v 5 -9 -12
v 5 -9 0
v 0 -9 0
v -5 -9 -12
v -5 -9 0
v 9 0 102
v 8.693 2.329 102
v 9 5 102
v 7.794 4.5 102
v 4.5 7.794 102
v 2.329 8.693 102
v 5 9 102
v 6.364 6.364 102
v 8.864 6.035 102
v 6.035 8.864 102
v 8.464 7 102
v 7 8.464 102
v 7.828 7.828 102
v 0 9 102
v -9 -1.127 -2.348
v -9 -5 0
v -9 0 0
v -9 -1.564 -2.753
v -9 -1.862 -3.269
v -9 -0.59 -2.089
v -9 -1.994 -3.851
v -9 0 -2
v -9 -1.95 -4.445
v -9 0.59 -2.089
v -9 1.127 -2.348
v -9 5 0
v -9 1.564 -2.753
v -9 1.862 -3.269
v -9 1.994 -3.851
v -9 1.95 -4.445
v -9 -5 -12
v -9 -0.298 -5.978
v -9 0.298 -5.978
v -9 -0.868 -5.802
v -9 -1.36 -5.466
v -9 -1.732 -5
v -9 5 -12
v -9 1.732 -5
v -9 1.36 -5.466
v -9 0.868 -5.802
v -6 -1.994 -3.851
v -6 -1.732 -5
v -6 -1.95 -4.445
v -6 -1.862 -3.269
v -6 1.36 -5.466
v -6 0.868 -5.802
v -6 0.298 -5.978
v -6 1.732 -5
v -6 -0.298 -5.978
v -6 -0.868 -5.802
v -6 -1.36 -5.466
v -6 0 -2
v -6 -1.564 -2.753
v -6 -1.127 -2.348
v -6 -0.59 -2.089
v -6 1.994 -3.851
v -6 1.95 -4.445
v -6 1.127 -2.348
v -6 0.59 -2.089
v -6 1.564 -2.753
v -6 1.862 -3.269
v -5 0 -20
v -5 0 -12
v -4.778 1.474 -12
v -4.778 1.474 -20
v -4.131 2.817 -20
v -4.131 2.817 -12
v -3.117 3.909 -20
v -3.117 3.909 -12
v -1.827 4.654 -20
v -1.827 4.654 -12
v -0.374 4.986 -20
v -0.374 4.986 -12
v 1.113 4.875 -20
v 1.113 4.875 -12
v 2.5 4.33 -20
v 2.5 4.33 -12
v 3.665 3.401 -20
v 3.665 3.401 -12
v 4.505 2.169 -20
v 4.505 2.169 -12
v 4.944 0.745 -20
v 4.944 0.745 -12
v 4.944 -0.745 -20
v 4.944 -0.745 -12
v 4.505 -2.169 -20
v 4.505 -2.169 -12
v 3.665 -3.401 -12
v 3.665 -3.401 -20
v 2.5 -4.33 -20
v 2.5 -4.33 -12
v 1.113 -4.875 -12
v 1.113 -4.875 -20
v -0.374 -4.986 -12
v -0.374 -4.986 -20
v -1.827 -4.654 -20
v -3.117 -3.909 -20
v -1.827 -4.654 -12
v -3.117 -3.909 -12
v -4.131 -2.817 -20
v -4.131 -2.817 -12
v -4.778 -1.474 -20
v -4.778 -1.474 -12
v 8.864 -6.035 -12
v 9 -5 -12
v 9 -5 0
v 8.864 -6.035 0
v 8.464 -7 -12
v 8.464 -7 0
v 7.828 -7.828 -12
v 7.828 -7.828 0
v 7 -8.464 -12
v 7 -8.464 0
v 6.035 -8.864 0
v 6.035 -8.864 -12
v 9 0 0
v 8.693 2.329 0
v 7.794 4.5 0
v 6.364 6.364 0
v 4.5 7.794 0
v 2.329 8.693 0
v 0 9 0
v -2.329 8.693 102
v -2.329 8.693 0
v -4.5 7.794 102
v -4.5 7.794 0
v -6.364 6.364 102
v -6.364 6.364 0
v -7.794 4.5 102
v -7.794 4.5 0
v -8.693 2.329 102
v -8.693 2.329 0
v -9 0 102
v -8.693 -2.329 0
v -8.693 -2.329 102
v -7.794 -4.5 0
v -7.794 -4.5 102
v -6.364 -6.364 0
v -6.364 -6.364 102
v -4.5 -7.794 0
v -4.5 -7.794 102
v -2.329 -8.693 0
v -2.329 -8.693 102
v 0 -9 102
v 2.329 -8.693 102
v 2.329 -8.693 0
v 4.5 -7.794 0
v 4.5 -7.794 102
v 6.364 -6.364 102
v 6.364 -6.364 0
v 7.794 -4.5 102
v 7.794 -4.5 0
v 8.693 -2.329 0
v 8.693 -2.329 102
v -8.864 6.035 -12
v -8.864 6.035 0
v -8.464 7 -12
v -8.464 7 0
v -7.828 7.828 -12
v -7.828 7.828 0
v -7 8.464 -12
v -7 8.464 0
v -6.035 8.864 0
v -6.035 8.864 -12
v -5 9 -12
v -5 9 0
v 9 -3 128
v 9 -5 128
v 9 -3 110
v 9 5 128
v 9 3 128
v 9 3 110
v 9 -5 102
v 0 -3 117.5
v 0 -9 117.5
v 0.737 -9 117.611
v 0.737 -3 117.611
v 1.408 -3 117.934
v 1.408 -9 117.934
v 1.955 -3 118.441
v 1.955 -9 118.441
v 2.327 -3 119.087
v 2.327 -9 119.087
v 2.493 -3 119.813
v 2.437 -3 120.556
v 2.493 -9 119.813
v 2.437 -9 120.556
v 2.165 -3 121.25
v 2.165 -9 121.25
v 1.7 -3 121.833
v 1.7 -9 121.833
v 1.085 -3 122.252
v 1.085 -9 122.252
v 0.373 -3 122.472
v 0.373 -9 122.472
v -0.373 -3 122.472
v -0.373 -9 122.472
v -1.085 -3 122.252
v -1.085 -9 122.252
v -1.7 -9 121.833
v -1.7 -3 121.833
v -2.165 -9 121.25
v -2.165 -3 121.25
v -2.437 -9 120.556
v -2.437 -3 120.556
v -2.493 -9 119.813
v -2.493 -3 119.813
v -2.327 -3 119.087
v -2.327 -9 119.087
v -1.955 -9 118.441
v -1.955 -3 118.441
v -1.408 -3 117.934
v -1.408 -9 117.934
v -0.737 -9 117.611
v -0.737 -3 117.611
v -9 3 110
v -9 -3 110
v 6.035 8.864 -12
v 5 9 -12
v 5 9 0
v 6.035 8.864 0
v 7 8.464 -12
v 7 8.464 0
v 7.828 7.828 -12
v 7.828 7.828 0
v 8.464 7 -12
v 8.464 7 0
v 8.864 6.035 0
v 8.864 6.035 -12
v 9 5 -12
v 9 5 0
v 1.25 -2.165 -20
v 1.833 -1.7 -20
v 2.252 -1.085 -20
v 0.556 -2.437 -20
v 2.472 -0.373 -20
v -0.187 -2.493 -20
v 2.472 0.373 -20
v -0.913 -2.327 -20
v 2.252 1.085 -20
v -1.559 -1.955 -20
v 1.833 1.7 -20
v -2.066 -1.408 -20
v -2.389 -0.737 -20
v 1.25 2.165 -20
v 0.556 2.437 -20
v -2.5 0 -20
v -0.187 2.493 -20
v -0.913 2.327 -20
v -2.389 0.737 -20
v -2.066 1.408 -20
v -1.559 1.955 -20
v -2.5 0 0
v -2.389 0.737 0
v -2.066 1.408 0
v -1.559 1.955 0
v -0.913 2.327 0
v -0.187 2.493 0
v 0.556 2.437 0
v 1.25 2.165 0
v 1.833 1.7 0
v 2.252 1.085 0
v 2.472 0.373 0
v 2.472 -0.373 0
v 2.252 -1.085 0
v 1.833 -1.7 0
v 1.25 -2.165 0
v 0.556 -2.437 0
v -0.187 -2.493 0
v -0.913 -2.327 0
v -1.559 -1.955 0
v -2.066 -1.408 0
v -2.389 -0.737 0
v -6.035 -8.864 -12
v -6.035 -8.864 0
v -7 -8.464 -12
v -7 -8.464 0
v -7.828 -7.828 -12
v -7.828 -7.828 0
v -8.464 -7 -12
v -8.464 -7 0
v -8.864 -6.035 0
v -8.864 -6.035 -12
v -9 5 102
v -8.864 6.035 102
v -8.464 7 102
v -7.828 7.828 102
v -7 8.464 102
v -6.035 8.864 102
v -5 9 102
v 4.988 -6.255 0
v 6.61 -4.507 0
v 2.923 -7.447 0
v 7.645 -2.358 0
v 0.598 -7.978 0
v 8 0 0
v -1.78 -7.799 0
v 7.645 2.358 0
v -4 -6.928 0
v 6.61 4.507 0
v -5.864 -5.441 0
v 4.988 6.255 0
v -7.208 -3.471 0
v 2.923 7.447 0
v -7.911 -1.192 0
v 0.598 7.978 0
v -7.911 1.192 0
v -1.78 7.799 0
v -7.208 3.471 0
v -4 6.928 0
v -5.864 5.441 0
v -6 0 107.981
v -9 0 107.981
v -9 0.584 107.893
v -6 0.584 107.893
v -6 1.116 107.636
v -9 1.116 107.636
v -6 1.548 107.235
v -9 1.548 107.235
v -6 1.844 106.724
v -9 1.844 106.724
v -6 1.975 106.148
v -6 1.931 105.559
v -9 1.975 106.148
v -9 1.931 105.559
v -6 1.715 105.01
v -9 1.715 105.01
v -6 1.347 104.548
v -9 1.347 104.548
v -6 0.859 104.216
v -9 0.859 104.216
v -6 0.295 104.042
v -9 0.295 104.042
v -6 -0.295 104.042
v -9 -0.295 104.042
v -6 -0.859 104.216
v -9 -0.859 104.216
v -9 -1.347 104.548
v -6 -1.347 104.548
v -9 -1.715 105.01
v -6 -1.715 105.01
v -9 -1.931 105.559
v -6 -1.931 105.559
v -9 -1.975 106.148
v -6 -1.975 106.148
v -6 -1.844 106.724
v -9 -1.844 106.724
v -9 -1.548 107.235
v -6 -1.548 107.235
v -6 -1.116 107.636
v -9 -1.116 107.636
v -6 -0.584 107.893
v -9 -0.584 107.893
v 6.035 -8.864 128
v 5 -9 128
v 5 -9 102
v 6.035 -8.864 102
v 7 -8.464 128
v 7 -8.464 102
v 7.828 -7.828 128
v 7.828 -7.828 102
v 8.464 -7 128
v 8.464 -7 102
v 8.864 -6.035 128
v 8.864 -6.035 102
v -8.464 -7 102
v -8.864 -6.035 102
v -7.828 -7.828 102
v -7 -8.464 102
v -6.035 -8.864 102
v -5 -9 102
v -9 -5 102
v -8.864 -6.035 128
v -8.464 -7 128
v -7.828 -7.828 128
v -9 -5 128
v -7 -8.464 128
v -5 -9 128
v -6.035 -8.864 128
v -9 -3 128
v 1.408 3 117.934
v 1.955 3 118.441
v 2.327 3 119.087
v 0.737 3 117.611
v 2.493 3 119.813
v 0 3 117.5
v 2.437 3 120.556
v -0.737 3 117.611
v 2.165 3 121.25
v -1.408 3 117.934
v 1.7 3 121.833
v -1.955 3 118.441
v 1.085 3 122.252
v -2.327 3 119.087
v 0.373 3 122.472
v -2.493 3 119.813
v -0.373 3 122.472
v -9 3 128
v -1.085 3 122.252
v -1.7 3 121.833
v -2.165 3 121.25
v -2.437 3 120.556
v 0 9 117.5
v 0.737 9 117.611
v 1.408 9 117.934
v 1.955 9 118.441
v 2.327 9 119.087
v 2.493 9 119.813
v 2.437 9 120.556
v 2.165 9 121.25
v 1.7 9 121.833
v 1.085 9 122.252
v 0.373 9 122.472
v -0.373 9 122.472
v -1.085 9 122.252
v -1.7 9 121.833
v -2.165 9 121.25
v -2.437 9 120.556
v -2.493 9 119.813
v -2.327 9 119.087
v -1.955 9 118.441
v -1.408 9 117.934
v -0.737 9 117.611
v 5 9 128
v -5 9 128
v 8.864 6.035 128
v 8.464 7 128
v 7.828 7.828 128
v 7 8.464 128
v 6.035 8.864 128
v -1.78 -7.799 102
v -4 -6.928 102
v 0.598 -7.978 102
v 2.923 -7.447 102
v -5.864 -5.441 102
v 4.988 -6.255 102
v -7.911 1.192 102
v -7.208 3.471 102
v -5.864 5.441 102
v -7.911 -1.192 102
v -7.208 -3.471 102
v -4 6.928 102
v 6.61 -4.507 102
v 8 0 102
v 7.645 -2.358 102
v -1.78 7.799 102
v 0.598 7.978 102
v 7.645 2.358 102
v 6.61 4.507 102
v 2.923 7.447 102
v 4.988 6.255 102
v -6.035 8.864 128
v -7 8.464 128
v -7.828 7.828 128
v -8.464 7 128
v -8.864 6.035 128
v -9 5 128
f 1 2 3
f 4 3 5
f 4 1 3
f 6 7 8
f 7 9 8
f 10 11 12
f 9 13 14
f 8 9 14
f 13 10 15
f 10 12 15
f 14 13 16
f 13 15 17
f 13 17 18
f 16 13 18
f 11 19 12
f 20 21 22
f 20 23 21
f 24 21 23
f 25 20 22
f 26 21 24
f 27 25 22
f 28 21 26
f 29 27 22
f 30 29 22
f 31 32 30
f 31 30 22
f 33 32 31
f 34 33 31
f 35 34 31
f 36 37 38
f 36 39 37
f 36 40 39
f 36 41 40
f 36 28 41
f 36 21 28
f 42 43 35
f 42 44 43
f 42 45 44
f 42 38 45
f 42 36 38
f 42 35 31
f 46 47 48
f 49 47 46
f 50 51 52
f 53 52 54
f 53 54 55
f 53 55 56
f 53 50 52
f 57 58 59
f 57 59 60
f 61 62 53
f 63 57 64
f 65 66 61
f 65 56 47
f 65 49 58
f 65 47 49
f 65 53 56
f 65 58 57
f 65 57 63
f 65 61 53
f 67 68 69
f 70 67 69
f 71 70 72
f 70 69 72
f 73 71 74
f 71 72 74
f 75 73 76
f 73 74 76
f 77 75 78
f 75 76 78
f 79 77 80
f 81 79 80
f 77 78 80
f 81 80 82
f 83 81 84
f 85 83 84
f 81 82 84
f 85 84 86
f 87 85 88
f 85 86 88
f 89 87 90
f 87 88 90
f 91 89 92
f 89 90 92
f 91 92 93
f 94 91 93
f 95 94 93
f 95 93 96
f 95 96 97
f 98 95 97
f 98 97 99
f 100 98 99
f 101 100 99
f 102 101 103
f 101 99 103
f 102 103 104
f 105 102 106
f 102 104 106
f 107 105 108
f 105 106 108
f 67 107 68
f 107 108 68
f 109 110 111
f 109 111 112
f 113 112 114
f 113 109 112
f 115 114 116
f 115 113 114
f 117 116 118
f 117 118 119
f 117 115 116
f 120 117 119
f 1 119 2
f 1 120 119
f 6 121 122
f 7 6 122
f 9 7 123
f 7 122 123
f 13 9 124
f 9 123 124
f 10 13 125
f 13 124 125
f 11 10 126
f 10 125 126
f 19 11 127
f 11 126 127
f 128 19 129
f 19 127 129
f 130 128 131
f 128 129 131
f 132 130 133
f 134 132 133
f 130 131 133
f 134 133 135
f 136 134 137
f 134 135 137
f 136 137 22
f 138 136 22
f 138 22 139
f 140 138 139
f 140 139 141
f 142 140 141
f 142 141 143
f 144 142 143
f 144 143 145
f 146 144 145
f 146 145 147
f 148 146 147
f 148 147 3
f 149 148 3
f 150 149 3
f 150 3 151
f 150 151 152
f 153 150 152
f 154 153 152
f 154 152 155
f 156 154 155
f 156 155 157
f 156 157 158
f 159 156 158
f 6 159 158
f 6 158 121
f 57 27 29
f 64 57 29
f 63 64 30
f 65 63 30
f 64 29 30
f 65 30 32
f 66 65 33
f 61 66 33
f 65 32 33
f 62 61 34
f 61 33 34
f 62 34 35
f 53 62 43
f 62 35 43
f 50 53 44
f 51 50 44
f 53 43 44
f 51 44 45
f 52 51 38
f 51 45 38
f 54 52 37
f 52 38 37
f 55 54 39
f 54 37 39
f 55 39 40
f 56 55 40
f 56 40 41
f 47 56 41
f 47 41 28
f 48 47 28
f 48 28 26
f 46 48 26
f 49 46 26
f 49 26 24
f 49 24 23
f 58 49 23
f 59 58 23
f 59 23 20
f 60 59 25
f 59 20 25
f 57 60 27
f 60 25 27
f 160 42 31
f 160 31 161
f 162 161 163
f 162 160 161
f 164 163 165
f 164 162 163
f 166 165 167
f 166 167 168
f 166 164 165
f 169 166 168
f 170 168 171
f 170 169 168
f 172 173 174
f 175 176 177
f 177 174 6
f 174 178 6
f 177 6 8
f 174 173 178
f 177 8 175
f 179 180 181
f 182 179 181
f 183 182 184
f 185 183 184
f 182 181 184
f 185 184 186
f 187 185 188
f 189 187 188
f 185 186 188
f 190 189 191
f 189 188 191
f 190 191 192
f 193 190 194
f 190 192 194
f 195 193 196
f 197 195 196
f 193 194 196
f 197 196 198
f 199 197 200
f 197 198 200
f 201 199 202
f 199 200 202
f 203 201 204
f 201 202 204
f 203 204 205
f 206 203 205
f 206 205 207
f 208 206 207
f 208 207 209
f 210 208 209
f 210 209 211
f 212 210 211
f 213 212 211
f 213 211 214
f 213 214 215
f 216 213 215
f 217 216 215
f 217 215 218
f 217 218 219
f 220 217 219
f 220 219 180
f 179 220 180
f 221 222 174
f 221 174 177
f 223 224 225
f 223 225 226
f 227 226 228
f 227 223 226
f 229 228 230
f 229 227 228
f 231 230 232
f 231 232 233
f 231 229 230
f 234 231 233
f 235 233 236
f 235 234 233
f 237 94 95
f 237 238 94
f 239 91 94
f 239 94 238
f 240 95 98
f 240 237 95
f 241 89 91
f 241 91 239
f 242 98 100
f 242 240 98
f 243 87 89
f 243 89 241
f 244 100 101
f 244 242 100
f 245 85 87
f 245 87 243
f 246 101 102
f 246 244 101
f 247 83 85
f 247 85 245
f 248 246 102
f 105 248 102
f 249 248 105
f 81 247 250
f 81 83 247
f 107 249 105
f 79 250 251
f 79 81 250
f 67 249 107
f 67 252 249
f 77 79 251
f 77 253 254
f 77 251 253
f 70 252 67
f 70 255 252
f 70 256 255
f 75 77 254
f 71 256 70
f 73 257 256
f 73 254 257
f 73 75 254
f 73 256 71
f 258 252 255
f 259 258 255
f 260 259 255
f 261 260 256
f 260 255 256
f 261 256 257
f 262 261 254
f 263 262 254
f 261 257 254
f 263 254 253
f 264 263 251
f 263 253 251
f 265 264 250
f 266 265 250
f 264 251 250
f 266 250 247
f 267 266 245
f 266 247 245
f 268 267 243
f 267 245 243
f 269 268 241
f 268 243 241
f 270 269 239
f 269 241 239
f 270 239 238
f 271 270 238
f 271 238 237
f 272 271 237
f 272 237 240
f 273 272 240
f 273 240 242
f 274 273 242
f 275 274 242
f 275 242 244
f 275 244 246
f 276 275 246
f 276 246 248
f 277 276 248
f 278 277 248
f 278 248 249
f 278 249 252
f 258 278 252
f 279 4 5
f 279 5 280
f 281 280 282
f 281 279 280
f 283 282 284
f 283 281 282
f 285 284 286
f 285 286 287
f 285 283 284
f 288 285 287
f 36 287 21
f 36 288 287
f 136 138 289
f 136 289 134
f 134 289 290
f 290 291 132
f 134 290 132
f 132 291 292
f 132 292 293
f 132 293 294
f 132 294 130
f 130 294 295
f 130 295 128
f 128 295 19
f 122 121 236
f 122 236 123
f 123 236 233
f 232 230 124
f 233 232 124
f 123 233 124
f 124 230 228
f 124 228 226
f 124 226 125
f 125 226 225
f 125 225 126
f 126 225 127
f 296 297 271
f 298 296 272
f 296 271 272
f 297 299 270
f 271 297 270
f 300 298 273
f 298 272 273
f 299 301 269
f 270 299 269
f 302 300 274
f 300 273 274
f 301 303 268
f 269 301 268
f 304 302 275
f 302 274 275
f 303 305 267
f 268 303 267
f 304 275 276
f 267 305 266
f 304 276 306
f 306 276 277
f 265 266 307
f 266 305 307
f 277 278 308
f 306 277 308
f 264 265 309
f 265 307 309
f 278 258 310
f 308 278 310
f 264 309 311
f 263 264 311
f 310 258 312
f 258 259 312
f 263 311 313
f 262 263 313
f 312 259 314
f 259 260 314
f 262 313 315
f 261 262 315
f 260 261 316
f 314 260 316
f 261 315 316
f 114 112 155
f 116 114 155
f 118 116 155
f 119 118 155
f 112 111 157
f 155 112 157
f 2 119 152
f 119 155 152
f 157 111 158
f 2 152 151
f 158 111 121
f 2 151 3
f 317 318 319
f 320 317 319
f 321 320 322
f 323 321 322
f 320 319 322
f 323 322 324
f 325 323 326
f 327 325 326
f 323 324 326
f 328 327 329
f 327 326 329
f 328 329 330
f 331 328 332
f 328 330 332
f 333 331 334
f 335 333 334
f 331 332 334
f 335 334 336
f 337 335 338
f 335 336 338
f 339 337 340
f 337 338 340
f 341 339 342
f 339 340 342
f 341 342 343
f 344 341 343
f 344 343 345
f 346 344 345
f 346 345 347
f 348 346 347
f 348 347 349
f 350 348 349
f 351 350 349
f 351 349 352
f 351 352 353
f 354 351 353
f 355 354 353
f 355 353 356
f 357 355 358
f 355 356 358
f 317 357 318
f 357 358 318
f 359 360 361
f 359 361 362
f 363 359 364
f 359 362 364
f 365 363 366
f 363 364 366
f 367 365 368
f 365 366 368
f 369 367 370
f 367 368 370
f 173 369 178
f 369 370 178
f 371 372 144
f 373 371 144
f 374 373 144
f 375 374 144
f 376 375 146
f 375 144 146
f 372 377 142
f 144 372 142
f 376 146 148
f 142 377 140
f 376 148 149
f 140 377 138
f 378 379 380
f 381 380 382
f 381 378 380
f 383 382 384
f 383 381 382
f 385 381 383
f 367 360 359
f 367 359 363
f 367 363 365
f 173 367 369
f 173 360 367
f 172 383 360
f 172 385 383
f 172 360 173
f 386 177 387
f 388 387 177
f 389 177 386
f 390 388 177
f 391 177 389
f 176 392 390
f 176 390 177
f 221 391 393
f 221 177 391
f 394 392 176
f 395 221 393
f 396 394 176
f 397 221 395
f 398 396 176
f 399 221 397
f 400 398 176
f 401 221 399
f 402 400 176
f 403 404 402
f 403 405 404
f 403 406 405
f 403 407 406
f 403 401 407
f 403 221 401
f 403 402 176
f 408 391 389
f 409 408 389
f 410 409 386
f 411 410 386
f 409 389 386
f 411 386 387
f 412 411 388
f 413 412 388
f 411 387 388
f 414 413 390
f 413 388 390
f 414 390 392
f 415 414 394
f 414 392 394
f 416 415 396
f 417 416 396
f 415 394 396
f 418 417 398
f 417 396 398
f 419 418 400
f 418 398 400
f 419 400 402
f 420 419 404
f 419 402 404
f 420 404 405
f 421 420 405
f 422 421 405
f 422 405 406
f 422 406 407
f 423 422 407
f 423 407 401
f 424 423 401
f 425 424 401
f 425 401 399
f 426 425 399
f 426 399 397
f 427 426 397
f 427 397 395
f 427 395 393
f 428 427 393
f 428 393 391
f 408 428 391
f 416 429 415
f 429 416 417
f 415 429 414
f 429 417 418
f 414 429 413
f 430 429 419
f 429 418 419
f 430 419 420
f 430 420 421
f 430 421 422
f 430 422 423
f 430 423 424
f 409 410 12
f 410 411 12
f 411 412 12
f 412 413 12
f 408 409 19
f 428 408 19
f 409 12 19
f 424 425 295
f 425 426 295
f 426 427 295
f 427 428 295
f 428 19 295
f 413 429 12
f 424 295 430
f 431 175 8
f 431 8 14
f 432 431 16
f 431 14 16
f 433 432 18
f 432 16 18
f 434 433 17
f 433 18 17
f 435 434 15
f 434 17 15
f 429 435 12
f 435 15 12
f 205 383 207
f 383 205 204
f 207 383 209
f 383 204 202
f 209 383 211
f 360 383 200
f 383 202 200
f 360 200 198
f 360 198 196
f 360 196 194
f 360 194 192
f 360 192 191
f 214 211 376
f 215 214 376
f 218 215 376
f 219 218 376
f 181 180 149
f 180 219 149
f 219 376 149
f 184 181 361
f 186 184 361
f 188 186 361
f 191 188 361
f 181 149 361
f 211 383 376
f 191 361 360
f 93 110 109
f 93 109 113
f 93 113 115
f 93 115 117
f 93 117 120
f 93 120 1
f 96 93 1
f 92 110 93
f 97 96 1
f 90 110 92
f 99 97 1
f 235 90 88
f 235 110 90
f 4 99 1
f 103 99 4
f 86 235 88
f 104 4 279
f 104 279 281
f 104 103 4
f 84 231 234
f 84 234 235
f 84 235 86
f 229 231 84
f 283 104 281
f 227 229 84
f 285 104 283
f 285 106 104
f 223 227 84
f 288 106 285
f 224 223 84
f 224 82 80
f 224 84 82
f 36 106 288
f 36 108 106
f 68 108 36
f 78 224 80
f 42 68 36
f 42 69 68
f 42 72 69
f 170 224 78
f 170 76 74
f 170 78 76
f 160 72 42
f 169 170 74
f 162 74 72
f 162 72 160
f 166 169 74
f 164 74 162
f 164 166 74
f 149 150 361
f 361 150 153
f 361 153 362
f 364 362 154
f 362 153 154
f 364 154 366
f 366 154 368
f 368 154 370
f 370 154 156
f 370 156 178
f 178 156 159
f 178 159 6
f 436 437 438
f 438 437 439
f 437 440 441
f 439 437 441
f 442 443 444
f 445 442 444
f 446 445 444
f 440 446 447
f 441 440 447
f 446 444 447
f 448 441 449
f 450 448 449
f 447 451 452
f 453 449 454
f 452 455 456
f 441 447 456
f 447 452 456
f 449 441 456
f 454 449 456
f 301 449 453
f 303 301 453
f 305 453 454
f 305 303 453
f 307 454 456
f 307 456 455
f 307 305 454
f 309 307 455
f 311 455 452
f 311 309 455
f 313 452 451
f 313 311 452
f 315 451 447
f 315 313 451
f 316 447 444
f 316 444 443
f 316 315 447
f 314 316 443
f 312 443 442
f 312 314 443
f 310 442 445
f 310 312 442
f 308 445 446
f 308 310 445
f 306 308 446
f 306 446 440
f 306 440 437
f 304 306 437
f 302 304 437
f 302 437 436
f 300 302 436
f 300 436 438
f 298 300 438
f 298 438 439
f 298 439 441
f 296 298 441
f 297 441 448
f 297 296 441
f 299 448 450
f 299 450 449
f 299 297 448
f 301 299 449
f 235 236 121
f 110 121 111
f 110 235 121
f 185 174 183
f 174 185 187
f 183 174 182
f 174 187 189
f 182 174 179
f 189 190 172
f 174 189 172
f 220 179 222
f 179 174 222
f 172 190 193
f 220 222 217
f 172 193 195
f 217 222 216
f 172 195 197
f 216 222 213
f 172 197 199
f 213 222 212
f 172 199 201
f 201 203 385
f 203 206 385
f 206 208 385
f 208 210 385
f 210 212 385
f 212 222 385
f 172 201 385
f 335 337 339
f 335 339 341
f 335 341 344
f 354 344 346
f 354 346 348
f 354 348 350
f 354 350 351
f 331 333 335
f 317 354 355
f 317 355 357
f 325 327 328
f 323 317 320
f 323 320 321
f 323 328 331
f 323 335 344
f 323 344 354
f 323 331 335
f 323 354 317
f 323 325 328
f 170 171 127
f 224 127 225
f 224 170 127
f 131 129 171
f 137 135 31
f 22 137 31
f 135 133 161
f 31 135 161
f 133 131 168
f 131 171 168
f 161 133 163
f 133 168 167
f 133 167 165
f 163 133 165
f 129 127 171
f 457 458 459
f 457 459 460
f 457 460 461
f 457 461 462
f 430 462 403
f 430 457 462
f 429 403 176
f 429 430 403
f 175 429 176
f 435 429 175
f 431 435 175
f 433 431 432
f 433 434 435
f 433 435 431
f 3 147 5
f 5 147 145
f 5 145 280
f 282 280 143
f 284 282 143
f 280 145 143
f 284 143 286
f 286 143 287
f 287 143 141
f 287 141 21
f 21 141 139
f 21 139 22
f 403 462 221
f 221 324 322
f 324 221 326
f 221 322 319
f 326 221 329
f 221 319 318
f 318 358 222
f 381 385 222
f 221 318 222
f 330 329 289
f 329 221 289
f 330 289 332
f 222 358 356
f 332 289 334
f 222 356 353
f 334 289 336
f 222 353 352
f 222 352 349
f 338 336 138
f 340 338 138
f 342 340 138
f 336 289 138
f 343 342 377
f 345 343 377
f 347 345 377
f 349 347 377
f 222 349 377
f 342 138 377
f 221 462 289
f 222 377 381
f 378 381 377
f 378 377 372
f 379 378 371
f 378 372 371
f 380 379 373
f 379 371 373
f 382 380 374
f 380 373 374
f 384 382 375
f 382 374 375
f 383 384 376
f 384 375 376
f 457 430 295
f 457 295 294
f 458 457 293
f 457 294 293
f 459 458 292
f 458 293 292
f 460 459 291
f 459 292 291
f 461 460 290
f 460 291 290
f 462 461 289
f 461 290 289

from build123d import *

# Parameters (mm, degrees)
SKETCH_1_R          = 9
SKETCH_1_R_2        = 8
EXTRUDE_1_DEPTH     = 102
EXTRUDE_2_DEPTH     = 26
EXTRUDE_START       = 12
EXTRUDE_3_DEPTH     = 12
SKETCH_4_R          = 5
EXTRUDE_4_DEPTH     = 8
SKETCH_5_R          = 2.5
CUT_EXTRUDE_1_DEPTH = 38
SKETCH_6_R          = 2
SKETCH_6_R_2        = 1.980516498
CUT_EXTRUDE_3_DEPTH = 3
SKETCH_7_W          = 18
SKETCH_7_H          = 6
CUT_EXTRUDE_4_DEPTH = 20
SKETCH_8_R          = 2.5
CUT_EXTRUDE_5_DEPTH = 20


with BuildPart() as part:
    # 草图1 → 凸台-拉伸1 (new body)
    with BuildSketch(Plane.XY):
        Circle(SKETCH_1_R)
        Circle(SKETCH_1_R_2, mode=Mode.SUBTRACT)
    extrude(amount=EXTRUDE_1_DEPTH)

    # 草图2 → 凸台-拉伸2 (add)
    with BuildSketch(Plane.XY.offset(102)):
        with BuildLine():
            Line((-5, -9), (5, -9))
            ThreePointArc((5, -9), (7.828427125, -7.828427125), (9, -5))
            Line((9, -5), (9, 5))
            ThreePointArc((9, 5), (7.828427125, 7.828427125), (5, 9))
            Line((5, 9), (-5, 9))
            ThreePointArc((-5, 9), (-7.828427125, 7.828427125), (-9, 5))
            Line((-9, 5), (-9, -5))
            ThreePointArc((-9, -5), (-7.828427125, -7.828427125), (-5, -9))
        make_face()
    extrude(amount=EXTRUDE_2_DEPTH)

    # 草图3 → 凸台-拉伸3 (add)
    with BuildSketch(Plane(origin=(0, 0, 0), x_dir=(-1, 0, 0), z_dir=(0, 0, -1)).offset(EXTRUDE_START)):
        with BuildLine():
            Line((-5, -9), (5, -9))
            ThreePointArc((5, -9), (7.828427125, -7.828427125), (9, -5))
            Line((9, -5), (9, 5))
            ThreePointArc((9, 5), (7.828427125, 7.828427125), (5, 9))
            Line((5, 9), (-5, 9))
            ThreePointArc((-5, 9), (-7.828427125, 7.828427125), (-9, 5))
            Line((-9, 5), (-9, -5))
            ThreePointArc((-9, -5), (-7.828427125, -7.828427125), (-5, -9))
        make_face()
    extrude(amount=-EXTRUDE_3_DEPTH)

    # 草图4 → 凸台-拉伸4 (add)
    with BuildSketch(Plane(origin=(0, 0, -12), x_dir=(-1, 0, 0), z_dir=(0, 0, -1))):
        Circle(SKETCH_4_R)
    extrude(amount=EXTRUDE_4_DEPTH)

    # 草图5 → 切除-拉伸1 (cut)
    with BuildSketch(Plane(origin=(0, 0, -20), x_dir=(-1, 0, 0), z_dir=(0, 0, -1))):
        Circle(SKETCH_5_R)
    extrude(amount=-CUT_EXTRUDE_1_DEPTH, mode=Mode.SUBTRACT)

    # 草图6 → 切除-拉伸3 (cut)
    with BuildSketch(Plane.ZY.offset(9)):
        with Locations((-4, 0)):
            Circle(SKETCH_6_R)
        with Locations((106, 0)):
            Circle(SKETCH_6_R_2)
    extrude(amount=-CUT_EXTRUDE_3_DEPTH, mode=Mode.SUBTRACT)

    # 草图7 → 切除-拉伸4 (cut)
    with BuildSketch(Plane.ZY.offset(9)):
        with Locations((119, 0)):
            Rectangle(SKETCH_7_W, SKETCH_7_H)
    extrude(amount=-CUT_EXTRUDE_4_DEPTH, mode=Mode.SUBTRACT)

    # 草图8 → 切除-拉伸5 (cut)
    with BuildSketch(Plane.XZ.offset(9)):
        with Locations(Location((0, 120, 0), (0, 0, 270))):
            Circle(SKETCH_8_R)
    extrude(amount=-CUT_EXTRUDE_5_DEPTH, mode=Mode.SUBTRACT)


solid = part.part
